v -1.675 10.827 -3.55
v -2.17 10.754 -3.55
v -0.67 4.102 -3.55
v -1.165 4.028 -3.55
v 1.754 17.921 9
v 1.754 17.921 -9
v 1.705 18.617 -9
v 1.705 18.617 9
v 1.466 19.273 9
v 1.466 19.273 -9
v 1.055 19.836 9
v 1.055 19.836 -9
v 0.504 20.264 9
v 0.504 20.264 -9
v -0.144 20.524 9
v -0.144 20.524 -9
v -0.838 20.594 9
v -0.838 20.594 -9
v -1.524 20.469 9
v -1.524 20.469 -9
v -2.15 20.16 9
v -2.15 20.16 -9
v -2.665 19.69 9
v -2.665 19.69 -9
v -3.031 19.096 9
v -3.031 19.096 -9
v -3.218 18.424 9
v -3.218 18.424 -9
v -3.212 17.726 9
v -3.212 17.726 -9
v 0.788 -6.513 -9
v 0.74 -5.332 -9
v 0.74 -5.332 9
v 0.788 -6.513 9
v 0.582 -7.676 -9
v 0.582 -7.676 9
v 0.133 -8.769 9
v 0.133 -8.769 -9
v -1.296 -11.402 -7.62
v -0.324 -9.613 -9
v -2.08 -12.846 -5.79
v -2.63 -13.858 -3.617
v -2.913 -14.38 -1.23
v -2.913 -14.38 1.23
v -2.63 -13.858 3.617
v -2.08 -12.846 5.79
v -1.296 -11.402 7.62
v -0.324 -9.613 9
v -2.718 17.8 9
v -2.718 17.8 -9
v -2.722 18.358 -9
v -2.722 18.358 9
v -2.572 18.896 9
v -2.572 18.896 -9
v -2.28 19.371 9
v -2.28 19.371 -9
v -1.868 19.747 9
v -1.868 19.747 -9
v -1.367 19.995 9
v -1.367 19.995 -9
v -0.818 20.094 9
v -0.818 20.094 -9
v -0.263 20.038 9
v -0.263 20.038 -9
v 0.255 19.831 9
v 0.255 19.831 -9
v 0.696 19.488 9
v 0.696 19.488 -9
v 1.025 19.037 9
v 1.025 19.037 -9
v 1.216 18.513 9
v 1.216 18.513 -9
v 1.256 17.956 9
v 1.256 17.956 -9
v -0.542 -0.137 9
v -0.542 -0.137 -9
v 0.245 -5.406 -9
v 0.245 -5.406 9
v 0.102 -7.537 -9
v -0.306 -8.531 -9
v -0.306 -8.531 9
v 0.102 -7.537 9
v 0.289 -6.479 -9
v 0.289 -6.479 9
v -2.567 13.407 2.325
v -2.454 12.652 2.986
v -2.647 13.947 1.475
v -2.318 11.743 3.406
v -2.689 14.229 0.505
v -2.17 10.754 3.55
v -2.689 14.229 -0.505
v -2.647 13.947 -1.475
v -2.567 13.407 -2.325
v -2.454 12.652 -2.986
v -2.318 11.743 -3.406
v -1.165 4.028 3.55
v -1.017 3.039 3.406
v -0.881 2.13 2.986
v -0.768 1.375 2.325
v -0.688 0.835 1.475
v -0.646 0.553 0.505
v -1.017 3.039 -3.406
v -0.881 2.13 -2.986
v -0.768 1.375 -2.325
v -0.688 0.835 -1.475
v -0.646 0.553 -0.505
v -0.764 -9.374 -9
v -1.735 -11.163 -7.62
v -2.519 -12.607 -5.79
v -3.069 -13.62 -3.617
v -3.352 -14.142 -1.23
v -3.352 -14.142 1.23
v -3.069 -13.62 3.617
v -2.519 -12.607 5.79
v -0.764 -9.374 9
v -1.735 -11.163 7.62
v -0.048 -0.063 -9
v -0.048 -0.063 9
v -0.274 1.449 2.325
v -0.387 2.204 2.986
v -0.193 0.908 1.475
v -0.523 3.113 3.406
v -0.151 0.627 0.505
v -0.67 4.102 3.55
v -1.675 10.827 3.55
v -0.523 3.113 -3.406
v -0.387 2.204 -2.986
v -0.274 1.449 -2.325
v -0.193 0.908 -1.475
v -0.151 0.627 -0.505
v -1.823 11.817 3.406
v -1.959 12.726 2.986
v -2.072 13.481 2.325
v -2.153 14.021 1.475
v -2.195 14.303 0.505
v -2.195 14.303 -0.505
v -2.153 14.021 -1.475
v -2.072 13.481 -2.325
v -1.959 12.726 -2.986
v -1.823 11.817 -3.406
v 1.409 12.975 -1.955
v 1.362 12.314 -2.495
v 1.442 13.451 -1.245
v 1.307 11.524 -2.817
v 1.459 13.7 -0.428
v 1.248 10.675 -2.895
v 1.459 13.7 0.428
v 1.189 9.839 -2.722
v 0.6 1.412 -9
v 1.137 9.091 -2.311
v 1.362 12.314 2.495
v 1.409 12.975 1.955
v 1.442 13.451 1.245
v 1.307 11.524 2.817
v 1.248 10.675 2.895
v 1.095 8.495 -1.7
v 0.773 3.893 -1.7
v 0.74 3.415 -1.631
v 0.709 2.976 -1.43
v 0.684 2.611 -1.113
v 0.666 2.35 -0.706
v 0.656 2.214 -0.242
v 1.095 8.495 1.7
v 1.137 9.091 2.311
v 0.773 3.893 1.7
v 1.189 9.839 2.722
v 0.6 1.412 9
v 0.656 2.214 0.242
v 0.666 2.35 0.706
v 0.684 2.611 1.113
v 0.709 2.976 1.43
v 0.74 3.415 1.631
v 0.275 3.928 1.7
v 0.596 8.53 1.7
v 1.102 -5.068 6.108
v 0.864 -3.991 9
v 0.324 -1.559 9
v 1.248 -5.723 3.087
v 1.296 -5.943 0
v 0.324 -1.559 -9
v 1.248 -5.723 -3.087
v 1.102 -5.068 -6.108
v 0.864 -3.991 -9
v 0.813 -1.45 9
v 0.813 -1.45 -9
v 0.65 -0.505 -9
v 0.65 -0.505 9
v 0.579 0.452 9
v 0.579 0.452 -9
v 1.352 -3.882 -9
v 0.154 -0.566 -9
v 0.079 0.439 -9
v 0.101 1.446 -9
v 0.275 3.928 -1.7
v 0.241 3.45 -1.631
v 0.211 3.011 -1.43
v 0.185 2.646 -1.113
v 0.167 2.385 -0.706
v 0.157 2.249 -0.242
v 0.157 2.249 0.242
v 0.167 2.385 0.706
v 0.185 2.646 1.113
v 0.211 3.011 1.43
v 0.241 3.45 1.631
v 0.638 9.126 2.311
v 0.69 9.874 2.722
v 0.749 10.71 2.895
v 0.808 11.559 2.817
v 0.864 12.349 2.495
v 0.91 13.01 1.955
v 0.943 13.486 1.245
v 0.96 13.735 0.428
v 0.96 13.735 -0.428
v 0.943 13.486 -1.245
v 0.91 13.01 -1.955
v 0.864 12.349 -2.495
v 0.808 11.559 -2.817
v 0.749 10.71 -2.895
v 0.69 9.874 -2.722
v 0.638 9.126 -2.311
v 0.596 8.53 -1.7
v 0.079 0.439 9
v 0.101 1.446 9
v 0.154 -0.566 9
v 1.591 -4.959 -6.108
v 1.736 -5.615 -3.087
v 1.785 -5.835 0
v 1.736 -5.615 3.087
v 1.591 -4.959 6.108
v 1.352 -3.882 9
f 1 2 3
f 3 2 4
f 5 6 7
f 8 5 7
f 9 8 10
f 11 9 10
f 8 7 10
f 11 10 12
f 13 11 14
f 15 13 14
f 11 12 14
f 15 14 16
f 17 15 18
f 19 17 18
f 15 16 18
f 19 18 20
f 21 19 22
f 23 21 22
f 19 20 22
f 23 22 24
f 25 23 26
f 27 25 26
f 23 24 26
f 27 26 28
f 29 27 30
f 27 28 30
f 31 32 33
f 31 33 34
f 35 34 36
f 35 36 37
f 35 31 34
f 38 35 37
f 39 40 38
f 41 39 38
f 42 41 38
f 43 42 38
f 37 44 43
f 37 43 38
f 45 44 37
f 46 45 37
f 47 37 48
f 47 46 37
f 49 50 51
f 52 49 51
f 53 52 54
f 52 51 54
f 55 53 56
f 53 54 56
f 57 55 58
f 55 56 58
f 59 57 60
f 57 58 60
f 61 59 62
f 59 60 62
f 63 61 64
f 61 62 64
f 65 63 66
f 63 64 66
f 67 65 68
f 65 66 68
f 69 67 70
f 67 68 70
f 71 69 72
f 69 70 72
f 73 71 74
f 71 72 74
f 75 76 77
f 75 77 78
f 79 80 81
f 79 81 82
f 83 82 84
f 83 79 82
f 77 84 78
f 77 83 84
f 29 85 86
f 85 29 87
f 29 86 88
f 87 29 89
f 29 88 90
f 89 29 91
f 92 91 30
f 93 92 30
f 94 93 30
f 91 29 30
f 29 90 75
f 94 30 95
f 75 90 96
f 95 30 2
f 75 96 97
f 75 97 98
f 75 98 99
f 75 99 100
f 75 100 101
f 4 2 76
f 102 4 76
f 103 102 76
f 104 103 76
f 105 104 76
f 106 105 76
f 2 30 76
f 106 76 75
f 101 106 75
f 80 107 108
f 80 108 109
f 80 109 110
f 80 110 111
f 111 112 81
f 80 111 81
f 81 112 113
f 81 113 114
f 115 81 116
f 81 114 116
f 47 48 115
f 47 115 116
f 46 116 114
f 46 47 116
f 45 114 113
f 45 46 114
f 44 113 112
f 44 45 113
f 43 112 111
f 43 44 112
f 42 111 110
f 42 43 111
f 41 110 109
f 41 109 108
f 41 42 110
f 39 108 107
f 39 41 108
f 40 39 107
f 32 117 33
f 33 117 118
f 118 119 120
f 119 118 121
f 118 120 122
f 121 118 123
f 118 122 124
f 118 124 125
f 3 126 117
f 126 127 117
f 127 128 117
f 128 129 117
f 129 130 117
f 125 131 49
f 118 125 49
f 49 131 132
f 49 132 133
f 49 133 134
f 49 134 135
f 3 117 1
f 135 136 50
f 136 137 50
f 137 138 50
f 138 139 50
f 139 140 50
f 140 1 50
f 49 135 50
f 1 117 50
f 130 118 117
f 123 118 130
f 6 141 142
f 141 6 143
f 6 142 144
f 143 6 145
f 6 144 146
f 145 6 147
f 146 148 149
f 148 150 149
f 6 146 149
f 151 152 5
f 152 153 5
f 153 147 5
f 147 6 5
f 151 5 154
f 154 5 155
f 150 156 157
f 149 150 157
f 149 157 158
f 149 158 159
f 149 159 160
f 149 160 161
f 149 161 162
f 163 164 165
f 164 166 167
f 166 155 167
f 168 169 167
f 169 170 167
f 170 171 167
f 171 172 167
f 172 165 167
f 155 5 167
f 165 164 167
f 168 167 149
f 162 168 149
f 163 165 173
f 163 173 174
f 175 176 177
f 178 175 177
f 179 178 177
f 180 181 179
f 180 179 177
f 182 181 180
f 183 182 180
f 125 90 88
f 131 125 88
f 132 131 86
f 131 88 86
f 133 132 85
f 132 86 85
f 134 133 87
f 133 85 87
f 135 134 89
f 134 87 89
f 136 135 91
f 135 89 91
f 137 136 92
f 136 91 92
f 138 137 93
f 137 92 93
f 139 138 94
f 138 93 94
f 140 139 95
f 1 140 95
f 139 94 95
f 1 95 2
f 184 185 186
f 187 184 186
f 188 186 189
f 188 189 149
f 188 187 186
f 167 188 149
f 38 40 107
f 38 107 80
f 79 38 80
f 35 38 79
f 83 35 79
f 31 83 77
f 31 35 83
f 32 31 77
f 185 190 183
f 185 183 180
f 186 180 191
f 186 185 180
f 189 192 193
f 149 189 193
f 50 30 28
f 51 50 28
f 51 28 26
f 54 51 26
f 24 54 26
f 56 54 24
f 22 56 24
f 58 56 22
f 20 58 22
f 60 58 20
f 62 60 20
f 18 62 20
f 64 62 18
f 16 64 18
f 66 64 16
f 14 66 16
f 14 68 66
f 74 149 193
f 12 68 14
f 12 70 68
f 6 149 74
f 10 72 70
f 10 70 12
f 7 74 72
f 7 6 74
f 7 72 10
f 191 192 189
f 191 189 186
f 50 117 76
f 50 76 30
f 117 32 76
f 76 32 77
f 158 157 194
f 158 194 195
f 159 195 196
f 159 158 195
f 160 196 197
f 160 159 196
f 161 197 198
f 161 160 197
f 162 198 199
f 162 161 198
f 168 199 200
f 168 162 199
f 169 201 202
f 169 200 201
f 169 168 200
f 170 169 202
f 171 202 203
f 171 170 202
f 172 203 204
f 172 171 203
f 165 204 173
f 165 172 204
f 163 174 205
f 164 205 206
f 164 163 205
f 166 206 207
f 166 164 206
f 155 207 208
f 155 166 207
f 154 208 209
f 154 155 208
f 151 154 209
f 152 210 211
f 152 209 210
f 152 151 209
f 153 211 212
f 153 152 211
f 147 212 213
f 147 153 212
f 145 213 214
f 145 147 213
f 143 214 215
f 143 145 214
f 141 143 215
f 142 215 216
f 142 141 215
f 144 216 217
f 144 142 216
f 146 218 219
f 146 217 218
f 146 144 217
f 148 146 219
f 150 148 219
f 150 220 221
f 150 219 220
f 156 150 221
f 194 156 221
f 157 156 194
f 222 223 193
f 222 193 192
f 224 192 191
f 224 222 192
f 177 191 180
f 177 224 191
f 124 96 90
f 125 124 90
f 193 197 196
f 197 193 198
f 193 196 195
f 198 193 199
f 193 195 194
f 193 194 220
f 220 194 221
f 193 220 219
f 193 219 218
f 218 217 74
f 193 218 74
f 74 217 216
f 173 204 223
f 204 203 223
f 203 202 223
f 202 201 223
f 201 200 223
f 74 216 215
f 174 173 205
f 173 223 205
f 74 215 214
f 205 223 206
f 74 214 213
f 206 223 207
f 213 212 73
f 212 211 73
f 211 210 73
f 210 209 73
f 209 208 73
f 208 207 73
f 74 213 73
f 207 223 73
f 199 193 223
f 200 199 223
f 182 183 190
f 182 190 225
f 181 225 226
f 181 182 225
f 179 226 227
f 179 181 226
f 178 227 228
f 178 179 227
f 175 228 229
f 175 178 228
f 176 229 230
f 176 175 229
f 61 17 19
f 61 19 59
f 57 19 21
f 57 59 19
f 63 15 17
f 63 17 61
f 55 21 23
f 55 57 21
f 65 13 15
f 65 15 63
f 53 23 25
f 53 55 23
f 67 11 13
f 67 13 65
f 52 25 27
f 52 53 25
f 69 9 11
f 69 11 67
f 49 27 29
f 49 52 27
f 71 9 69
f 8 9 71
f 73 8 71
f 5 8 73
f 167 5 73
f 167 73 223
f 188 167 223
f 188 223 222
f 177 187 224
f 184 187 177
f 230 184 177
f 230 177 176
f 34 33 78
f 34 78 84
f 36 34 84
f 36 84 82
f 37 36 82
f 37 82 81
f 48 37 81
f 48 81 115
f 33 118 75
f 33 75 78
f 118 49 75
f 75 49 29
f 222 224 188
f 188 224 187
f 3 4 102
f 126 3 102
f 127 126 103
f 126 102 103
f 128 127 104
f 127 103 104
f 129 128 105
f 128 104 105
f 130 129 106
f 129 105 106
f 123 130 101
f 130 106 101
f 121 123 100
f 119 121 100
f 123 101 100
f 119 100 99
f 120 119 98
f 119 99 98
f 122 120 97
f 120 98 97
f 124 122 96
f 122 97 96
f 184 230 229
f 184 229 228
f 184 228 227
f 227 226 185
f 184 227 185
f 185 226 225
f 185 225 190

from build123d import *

# Parameters (mm, degrees)
TABAN_FLAN_1_DEPTH           = 9
KENAR_FLAN_1_STRIP_CUT_DEPTH = 18
KENAR_FLAN_1_DEPTH           = 18
KENAR_FLAN_1_START           = 0.5
KENAR_FLAN_1_FLAT_DEPTH      = 0.5
DIKI_1_START                 = -9
DIKI_1_DEPTH                 = 18
IZIM24_W                     = 18
IZIM24_H                     = 7
SEKME3_DEPTH                 = 0.5
KENAR_FLAN_2_STRIP_CUT_DEPTH = 18
KENAR_FLAN_2_DEPTH           = 18
KENAR_FLAN_2_START           = 0.5
KENAR_FLAN_2_FLAT_DEPTH      = 0.5
KES_EKSTR_ZYON1_REACH        = 24.729
KES_EKSTR_ZYON2_REACH        = 24.841


# Read off the part's stored shape, not the designer's step: Dikiş1
# Sheet-metal steps are written as plain solids
with BuildPart() as part:
    # Çizim1 → Taban-Flanş1 (new, symmetric)
    with BuildSketch(Plane.XY):
        Polygon((0, 0), (1.255616527, 17.956152905), (1.754398553, 17.921274668), (0.498782025, -0.034878237), align=None)
    extrude(amount=TABAN_FLAN_1_DEPTH, both=True)

    # Kenar-Flanş1 strip (across the edge) → Kenar-Flanş1 strip cut (cut)
    with BuildSketch(Plane(origin=(0.498782025, -0.034878237, 9), x_dir=(0.9762960071199348, 0.2164396139380966, 0), z_dir=(0, 0, -1))):
        Polygon((-6.3159448, 19.561804043), (-0.067607216, -1.532230124), (0.411802651, -1.390222452), (-5.836534932, 19.703811715), align=None)
    extrude(amount=KENAR_FLAN_1_STRIP_CUT_DEPTH, mode=Mode.SUBTRACT)

    # Kenar-Flanş1 bend section (across the edge) → Kenar-Flanş1 (add)
    with BuildSketch(Plane(origin=(0.498782025, -0.034878237, 9), x_dir=(0.9762960071199348, 0.2164396139380966, 0), z_dir=(0, 0, -1))):
        with BuildLine():
            Line((-0.5, 1.449930995), (0, 1.449930995))
            ThreePointArc((0, 1.449930995), (0.103486132, 0.015004775), (0.411802651, -1.390222452))
            Line((0.411802651, -1.390222452), (-0.067607216, -1.532230124))
            ThreePointArc((-0.067607216, -1.532230124), (-0.391339562, -0.056741536), (-0.5, 1.449930995))
        make_face()
    extrude(amount=KENAR_FLAN_1_DEPTH)

    # Kenar-Flanş1 profile (on flange) → Kenar-Flanş1 flat (add)
    with BuildSketch(Plane(origin=(0.498782025, -0.034878237, 0), x_dir=(0, 0, -1), z_dir=(-0.9762960071199348, -0.2164396139380966, 0)).offset(KENAR_FLAN_1_START)):
        with BuildLine():
            ThreePointArc((9, 3.9408211), (0, 5.9408211), (-9, 3.9408211))
            Line((-9, 3.9408211), (-9, 1.449930995))
            Line((-9, 1.449930995), (9, 1.449930995))
            Line((9, 1.449930995), (9, 3.9408211))
        make_face()
    extrude(amount=-KENAR_FLAN_1_FLAT_DEPTH)

    # Dikiş1 outline → Dikiş1 (add)
    with BuildSketch(Plane.XY.offset(DIKI_1_START)):
        with BuildLine():
            Line((-0.542336916, -0.13733327), (-0.047828985, -0.063428564))
            Line((-0.047828985, -0.063428564), (-2.7175433, 17.80004703))
            ThreePointArc((-2.7175433, 17.80004703), (-0.818031205, 20.094123925), (1.255616527, 17.956152905))
            Line((1.255616527, 17.956152905), (1.754398553, 17.921274668))
            ThreePointArc((1.754398553, 17.921274668), (-0.837661113, 20.593738443), (-3.212051232, 17.726142324))
            Line((-3.212051232, 17.726142324), (-0.542336916, -0.13733327))
        make_face()
    extrude(amount=DIKI_1_DEPTH)

    # Çizim24 → Sekme3 (add)
    with BuildSketch(Plane(origin=(-0.550564326, -0.08228239, 0), x_dir=(0, 0, 1), z_dir=(-0.989015863361916, -0.1478094111296166, 0))):
        with Locations((0, -3.555662282)):
            Rectangle(IZIM24_W, IZIM24_H)
    extrude(amount=-SEKME3_DEPTH)

    # Kenar-Flanş2 strip (across the edge) → Kenar-Flanş2 strip cut (cut)
    with BuildSketch(Plane(origin=(0.492328961, -7.060444313, -9), x_dir=(-0.8788171126619707, 0.4771587602595987, 0), z_dir=(0, 0, 1))):
        Polygon((-6.614275583, 7.946620091), (0.607504695, -1.63700603), (1.00682245, -1.336098518), (-6.214957828, 8.247527602), align=None)
    extrude(amount=KENAR_FLAN_2_STRIP_CUT_DEPTH, mode=Mode.SUBTRACT)

    # Kenar-Flanş2 bend section (across the edge) → Kenar-Flanş2 (add)
    with BuildSketch(Plane(origin=(0.492328961, -7.060444313, -9), x_dir=(-0.8788171126619707, 0.4771587602595987, 0), z_dir=(0, 0, 1))):
        with BuildLine():
            Line((-0.5, 1.672976598), (0, 1.672976598))
            ThreePointArc((0, 1.672976598), (0.258381724, 0.086453315), (1.00682245, -1.336098518))
            Line((1.00682245, -1.336098518), (0.607504695, -1.63700603))
            ThreePointArc((0.607504695, -1.63700603), (-0.215780104, -0.072199013), (-0.5, 1.672976598))
        make_face()
    extrude(amount=KENAR_FLAN_2_DEPTH)

    # Kenar-Flanş2 profile (on flange) → Kenar-Flanş2 flat (add)
    with BuildSketch(Plane(origin=(0.492328961, -7.060444313, 0), x_dir=(0, 0, 1), z_dir=(0.8788171126619707, -0.4771587602595987, 0)).offset(KENAR_FLAN_2_START)):
        with BuildLine():
            ThreePointArc((9, 2.63270234), (0, 8.13270234), (-9, 2.63270234))
            Line((-9, 2.63270234), (-9, 1.672976598))
            Line((-9, 1.672976598), (9, 1.672976598))
            Line((9, 1.672976598), (9, 2.63270234))
        make_face()
    extrude(amount=-KENAR_FLAN_2_FLAT_DEPTH)

    # Çizim31 → Kes-Ekstrüzyon1 (cut, up to next)
    with BuildSketch(Plane(origin=(-0.550564326, -0.08228239, 0), x_dir=(0, 0, 1), z_dir=(-0.9890158633619159, -0.1478094111296166, 0)), mode=Mode.PRIVATE) as kes_ekstr_zyon1_sk1:
        with BuildLine():
            Line((-3.55, 10.956207356), (-3.55, 4.156207356))
            ThreePointArc((-3.55, 4.156207356), (0, 0.606207356), (3.55, 4.156207356))
            Line((3.55, 4.156207356), (3.55, 10.956207356))
            ThreePointArc((3.55, 10.956207356), (0, 14.506207356), (-3.55, 10.956207356))
        make_face()
    kes_ekstr_zyon1_tool1 = extrude(kes_ekstr_zyon1_sk1.sketch, amount=-KES_EKSTR_ZYON1_REACH, mode=Mode.PRIVATE) & part.part
    add(kes_ekstr_zyon1_tool1.solids().sort_by_distance((-1.667443, 7.390927, 0))[0], mode=Mode.SUBTRACT)

    # Çizim32 → Kes-Ekstrüzyon2 (cut, up to next)
    with BuildSketch(Plane(origin=(0.498782025, -0.034878237, 0), x_dir=(0, 0, -1), z_dir=(0.9975640502598243, -0.06975647374412548, 0)), mode=Mode.PRIVATE) as kes_ekstr_zyon2_sk1:
        with BuildLine():
            Line((1.7, 8.550531975), (1.7, 3.937201267))
            ThreePointArc((1.7, 3.937201267), (0, 2.237201267), (-1.7, 3.937201267))
            Line((-1.7, 3.937201267), (-1.7, 8.550531975))
            ThreePointArc((-1.7, 8.550531975), (0, 13.8), (1.7, 8.550531975))
        make_face()
    kes_ekstr_zyon2_tool1 = extrude(kes_ekstr_zyon2_sk1.sketch, amount=-KES_EKSTR_ZYON2_REACH, mode=Mode.PRIVATE) & part.part
    add(kes_ekstr_zyon2_tool1.solids().sort_by_distance((1.098249, 8.537894, 0))[0], mode=Mode.SUBTRACT)


solid = part.part
